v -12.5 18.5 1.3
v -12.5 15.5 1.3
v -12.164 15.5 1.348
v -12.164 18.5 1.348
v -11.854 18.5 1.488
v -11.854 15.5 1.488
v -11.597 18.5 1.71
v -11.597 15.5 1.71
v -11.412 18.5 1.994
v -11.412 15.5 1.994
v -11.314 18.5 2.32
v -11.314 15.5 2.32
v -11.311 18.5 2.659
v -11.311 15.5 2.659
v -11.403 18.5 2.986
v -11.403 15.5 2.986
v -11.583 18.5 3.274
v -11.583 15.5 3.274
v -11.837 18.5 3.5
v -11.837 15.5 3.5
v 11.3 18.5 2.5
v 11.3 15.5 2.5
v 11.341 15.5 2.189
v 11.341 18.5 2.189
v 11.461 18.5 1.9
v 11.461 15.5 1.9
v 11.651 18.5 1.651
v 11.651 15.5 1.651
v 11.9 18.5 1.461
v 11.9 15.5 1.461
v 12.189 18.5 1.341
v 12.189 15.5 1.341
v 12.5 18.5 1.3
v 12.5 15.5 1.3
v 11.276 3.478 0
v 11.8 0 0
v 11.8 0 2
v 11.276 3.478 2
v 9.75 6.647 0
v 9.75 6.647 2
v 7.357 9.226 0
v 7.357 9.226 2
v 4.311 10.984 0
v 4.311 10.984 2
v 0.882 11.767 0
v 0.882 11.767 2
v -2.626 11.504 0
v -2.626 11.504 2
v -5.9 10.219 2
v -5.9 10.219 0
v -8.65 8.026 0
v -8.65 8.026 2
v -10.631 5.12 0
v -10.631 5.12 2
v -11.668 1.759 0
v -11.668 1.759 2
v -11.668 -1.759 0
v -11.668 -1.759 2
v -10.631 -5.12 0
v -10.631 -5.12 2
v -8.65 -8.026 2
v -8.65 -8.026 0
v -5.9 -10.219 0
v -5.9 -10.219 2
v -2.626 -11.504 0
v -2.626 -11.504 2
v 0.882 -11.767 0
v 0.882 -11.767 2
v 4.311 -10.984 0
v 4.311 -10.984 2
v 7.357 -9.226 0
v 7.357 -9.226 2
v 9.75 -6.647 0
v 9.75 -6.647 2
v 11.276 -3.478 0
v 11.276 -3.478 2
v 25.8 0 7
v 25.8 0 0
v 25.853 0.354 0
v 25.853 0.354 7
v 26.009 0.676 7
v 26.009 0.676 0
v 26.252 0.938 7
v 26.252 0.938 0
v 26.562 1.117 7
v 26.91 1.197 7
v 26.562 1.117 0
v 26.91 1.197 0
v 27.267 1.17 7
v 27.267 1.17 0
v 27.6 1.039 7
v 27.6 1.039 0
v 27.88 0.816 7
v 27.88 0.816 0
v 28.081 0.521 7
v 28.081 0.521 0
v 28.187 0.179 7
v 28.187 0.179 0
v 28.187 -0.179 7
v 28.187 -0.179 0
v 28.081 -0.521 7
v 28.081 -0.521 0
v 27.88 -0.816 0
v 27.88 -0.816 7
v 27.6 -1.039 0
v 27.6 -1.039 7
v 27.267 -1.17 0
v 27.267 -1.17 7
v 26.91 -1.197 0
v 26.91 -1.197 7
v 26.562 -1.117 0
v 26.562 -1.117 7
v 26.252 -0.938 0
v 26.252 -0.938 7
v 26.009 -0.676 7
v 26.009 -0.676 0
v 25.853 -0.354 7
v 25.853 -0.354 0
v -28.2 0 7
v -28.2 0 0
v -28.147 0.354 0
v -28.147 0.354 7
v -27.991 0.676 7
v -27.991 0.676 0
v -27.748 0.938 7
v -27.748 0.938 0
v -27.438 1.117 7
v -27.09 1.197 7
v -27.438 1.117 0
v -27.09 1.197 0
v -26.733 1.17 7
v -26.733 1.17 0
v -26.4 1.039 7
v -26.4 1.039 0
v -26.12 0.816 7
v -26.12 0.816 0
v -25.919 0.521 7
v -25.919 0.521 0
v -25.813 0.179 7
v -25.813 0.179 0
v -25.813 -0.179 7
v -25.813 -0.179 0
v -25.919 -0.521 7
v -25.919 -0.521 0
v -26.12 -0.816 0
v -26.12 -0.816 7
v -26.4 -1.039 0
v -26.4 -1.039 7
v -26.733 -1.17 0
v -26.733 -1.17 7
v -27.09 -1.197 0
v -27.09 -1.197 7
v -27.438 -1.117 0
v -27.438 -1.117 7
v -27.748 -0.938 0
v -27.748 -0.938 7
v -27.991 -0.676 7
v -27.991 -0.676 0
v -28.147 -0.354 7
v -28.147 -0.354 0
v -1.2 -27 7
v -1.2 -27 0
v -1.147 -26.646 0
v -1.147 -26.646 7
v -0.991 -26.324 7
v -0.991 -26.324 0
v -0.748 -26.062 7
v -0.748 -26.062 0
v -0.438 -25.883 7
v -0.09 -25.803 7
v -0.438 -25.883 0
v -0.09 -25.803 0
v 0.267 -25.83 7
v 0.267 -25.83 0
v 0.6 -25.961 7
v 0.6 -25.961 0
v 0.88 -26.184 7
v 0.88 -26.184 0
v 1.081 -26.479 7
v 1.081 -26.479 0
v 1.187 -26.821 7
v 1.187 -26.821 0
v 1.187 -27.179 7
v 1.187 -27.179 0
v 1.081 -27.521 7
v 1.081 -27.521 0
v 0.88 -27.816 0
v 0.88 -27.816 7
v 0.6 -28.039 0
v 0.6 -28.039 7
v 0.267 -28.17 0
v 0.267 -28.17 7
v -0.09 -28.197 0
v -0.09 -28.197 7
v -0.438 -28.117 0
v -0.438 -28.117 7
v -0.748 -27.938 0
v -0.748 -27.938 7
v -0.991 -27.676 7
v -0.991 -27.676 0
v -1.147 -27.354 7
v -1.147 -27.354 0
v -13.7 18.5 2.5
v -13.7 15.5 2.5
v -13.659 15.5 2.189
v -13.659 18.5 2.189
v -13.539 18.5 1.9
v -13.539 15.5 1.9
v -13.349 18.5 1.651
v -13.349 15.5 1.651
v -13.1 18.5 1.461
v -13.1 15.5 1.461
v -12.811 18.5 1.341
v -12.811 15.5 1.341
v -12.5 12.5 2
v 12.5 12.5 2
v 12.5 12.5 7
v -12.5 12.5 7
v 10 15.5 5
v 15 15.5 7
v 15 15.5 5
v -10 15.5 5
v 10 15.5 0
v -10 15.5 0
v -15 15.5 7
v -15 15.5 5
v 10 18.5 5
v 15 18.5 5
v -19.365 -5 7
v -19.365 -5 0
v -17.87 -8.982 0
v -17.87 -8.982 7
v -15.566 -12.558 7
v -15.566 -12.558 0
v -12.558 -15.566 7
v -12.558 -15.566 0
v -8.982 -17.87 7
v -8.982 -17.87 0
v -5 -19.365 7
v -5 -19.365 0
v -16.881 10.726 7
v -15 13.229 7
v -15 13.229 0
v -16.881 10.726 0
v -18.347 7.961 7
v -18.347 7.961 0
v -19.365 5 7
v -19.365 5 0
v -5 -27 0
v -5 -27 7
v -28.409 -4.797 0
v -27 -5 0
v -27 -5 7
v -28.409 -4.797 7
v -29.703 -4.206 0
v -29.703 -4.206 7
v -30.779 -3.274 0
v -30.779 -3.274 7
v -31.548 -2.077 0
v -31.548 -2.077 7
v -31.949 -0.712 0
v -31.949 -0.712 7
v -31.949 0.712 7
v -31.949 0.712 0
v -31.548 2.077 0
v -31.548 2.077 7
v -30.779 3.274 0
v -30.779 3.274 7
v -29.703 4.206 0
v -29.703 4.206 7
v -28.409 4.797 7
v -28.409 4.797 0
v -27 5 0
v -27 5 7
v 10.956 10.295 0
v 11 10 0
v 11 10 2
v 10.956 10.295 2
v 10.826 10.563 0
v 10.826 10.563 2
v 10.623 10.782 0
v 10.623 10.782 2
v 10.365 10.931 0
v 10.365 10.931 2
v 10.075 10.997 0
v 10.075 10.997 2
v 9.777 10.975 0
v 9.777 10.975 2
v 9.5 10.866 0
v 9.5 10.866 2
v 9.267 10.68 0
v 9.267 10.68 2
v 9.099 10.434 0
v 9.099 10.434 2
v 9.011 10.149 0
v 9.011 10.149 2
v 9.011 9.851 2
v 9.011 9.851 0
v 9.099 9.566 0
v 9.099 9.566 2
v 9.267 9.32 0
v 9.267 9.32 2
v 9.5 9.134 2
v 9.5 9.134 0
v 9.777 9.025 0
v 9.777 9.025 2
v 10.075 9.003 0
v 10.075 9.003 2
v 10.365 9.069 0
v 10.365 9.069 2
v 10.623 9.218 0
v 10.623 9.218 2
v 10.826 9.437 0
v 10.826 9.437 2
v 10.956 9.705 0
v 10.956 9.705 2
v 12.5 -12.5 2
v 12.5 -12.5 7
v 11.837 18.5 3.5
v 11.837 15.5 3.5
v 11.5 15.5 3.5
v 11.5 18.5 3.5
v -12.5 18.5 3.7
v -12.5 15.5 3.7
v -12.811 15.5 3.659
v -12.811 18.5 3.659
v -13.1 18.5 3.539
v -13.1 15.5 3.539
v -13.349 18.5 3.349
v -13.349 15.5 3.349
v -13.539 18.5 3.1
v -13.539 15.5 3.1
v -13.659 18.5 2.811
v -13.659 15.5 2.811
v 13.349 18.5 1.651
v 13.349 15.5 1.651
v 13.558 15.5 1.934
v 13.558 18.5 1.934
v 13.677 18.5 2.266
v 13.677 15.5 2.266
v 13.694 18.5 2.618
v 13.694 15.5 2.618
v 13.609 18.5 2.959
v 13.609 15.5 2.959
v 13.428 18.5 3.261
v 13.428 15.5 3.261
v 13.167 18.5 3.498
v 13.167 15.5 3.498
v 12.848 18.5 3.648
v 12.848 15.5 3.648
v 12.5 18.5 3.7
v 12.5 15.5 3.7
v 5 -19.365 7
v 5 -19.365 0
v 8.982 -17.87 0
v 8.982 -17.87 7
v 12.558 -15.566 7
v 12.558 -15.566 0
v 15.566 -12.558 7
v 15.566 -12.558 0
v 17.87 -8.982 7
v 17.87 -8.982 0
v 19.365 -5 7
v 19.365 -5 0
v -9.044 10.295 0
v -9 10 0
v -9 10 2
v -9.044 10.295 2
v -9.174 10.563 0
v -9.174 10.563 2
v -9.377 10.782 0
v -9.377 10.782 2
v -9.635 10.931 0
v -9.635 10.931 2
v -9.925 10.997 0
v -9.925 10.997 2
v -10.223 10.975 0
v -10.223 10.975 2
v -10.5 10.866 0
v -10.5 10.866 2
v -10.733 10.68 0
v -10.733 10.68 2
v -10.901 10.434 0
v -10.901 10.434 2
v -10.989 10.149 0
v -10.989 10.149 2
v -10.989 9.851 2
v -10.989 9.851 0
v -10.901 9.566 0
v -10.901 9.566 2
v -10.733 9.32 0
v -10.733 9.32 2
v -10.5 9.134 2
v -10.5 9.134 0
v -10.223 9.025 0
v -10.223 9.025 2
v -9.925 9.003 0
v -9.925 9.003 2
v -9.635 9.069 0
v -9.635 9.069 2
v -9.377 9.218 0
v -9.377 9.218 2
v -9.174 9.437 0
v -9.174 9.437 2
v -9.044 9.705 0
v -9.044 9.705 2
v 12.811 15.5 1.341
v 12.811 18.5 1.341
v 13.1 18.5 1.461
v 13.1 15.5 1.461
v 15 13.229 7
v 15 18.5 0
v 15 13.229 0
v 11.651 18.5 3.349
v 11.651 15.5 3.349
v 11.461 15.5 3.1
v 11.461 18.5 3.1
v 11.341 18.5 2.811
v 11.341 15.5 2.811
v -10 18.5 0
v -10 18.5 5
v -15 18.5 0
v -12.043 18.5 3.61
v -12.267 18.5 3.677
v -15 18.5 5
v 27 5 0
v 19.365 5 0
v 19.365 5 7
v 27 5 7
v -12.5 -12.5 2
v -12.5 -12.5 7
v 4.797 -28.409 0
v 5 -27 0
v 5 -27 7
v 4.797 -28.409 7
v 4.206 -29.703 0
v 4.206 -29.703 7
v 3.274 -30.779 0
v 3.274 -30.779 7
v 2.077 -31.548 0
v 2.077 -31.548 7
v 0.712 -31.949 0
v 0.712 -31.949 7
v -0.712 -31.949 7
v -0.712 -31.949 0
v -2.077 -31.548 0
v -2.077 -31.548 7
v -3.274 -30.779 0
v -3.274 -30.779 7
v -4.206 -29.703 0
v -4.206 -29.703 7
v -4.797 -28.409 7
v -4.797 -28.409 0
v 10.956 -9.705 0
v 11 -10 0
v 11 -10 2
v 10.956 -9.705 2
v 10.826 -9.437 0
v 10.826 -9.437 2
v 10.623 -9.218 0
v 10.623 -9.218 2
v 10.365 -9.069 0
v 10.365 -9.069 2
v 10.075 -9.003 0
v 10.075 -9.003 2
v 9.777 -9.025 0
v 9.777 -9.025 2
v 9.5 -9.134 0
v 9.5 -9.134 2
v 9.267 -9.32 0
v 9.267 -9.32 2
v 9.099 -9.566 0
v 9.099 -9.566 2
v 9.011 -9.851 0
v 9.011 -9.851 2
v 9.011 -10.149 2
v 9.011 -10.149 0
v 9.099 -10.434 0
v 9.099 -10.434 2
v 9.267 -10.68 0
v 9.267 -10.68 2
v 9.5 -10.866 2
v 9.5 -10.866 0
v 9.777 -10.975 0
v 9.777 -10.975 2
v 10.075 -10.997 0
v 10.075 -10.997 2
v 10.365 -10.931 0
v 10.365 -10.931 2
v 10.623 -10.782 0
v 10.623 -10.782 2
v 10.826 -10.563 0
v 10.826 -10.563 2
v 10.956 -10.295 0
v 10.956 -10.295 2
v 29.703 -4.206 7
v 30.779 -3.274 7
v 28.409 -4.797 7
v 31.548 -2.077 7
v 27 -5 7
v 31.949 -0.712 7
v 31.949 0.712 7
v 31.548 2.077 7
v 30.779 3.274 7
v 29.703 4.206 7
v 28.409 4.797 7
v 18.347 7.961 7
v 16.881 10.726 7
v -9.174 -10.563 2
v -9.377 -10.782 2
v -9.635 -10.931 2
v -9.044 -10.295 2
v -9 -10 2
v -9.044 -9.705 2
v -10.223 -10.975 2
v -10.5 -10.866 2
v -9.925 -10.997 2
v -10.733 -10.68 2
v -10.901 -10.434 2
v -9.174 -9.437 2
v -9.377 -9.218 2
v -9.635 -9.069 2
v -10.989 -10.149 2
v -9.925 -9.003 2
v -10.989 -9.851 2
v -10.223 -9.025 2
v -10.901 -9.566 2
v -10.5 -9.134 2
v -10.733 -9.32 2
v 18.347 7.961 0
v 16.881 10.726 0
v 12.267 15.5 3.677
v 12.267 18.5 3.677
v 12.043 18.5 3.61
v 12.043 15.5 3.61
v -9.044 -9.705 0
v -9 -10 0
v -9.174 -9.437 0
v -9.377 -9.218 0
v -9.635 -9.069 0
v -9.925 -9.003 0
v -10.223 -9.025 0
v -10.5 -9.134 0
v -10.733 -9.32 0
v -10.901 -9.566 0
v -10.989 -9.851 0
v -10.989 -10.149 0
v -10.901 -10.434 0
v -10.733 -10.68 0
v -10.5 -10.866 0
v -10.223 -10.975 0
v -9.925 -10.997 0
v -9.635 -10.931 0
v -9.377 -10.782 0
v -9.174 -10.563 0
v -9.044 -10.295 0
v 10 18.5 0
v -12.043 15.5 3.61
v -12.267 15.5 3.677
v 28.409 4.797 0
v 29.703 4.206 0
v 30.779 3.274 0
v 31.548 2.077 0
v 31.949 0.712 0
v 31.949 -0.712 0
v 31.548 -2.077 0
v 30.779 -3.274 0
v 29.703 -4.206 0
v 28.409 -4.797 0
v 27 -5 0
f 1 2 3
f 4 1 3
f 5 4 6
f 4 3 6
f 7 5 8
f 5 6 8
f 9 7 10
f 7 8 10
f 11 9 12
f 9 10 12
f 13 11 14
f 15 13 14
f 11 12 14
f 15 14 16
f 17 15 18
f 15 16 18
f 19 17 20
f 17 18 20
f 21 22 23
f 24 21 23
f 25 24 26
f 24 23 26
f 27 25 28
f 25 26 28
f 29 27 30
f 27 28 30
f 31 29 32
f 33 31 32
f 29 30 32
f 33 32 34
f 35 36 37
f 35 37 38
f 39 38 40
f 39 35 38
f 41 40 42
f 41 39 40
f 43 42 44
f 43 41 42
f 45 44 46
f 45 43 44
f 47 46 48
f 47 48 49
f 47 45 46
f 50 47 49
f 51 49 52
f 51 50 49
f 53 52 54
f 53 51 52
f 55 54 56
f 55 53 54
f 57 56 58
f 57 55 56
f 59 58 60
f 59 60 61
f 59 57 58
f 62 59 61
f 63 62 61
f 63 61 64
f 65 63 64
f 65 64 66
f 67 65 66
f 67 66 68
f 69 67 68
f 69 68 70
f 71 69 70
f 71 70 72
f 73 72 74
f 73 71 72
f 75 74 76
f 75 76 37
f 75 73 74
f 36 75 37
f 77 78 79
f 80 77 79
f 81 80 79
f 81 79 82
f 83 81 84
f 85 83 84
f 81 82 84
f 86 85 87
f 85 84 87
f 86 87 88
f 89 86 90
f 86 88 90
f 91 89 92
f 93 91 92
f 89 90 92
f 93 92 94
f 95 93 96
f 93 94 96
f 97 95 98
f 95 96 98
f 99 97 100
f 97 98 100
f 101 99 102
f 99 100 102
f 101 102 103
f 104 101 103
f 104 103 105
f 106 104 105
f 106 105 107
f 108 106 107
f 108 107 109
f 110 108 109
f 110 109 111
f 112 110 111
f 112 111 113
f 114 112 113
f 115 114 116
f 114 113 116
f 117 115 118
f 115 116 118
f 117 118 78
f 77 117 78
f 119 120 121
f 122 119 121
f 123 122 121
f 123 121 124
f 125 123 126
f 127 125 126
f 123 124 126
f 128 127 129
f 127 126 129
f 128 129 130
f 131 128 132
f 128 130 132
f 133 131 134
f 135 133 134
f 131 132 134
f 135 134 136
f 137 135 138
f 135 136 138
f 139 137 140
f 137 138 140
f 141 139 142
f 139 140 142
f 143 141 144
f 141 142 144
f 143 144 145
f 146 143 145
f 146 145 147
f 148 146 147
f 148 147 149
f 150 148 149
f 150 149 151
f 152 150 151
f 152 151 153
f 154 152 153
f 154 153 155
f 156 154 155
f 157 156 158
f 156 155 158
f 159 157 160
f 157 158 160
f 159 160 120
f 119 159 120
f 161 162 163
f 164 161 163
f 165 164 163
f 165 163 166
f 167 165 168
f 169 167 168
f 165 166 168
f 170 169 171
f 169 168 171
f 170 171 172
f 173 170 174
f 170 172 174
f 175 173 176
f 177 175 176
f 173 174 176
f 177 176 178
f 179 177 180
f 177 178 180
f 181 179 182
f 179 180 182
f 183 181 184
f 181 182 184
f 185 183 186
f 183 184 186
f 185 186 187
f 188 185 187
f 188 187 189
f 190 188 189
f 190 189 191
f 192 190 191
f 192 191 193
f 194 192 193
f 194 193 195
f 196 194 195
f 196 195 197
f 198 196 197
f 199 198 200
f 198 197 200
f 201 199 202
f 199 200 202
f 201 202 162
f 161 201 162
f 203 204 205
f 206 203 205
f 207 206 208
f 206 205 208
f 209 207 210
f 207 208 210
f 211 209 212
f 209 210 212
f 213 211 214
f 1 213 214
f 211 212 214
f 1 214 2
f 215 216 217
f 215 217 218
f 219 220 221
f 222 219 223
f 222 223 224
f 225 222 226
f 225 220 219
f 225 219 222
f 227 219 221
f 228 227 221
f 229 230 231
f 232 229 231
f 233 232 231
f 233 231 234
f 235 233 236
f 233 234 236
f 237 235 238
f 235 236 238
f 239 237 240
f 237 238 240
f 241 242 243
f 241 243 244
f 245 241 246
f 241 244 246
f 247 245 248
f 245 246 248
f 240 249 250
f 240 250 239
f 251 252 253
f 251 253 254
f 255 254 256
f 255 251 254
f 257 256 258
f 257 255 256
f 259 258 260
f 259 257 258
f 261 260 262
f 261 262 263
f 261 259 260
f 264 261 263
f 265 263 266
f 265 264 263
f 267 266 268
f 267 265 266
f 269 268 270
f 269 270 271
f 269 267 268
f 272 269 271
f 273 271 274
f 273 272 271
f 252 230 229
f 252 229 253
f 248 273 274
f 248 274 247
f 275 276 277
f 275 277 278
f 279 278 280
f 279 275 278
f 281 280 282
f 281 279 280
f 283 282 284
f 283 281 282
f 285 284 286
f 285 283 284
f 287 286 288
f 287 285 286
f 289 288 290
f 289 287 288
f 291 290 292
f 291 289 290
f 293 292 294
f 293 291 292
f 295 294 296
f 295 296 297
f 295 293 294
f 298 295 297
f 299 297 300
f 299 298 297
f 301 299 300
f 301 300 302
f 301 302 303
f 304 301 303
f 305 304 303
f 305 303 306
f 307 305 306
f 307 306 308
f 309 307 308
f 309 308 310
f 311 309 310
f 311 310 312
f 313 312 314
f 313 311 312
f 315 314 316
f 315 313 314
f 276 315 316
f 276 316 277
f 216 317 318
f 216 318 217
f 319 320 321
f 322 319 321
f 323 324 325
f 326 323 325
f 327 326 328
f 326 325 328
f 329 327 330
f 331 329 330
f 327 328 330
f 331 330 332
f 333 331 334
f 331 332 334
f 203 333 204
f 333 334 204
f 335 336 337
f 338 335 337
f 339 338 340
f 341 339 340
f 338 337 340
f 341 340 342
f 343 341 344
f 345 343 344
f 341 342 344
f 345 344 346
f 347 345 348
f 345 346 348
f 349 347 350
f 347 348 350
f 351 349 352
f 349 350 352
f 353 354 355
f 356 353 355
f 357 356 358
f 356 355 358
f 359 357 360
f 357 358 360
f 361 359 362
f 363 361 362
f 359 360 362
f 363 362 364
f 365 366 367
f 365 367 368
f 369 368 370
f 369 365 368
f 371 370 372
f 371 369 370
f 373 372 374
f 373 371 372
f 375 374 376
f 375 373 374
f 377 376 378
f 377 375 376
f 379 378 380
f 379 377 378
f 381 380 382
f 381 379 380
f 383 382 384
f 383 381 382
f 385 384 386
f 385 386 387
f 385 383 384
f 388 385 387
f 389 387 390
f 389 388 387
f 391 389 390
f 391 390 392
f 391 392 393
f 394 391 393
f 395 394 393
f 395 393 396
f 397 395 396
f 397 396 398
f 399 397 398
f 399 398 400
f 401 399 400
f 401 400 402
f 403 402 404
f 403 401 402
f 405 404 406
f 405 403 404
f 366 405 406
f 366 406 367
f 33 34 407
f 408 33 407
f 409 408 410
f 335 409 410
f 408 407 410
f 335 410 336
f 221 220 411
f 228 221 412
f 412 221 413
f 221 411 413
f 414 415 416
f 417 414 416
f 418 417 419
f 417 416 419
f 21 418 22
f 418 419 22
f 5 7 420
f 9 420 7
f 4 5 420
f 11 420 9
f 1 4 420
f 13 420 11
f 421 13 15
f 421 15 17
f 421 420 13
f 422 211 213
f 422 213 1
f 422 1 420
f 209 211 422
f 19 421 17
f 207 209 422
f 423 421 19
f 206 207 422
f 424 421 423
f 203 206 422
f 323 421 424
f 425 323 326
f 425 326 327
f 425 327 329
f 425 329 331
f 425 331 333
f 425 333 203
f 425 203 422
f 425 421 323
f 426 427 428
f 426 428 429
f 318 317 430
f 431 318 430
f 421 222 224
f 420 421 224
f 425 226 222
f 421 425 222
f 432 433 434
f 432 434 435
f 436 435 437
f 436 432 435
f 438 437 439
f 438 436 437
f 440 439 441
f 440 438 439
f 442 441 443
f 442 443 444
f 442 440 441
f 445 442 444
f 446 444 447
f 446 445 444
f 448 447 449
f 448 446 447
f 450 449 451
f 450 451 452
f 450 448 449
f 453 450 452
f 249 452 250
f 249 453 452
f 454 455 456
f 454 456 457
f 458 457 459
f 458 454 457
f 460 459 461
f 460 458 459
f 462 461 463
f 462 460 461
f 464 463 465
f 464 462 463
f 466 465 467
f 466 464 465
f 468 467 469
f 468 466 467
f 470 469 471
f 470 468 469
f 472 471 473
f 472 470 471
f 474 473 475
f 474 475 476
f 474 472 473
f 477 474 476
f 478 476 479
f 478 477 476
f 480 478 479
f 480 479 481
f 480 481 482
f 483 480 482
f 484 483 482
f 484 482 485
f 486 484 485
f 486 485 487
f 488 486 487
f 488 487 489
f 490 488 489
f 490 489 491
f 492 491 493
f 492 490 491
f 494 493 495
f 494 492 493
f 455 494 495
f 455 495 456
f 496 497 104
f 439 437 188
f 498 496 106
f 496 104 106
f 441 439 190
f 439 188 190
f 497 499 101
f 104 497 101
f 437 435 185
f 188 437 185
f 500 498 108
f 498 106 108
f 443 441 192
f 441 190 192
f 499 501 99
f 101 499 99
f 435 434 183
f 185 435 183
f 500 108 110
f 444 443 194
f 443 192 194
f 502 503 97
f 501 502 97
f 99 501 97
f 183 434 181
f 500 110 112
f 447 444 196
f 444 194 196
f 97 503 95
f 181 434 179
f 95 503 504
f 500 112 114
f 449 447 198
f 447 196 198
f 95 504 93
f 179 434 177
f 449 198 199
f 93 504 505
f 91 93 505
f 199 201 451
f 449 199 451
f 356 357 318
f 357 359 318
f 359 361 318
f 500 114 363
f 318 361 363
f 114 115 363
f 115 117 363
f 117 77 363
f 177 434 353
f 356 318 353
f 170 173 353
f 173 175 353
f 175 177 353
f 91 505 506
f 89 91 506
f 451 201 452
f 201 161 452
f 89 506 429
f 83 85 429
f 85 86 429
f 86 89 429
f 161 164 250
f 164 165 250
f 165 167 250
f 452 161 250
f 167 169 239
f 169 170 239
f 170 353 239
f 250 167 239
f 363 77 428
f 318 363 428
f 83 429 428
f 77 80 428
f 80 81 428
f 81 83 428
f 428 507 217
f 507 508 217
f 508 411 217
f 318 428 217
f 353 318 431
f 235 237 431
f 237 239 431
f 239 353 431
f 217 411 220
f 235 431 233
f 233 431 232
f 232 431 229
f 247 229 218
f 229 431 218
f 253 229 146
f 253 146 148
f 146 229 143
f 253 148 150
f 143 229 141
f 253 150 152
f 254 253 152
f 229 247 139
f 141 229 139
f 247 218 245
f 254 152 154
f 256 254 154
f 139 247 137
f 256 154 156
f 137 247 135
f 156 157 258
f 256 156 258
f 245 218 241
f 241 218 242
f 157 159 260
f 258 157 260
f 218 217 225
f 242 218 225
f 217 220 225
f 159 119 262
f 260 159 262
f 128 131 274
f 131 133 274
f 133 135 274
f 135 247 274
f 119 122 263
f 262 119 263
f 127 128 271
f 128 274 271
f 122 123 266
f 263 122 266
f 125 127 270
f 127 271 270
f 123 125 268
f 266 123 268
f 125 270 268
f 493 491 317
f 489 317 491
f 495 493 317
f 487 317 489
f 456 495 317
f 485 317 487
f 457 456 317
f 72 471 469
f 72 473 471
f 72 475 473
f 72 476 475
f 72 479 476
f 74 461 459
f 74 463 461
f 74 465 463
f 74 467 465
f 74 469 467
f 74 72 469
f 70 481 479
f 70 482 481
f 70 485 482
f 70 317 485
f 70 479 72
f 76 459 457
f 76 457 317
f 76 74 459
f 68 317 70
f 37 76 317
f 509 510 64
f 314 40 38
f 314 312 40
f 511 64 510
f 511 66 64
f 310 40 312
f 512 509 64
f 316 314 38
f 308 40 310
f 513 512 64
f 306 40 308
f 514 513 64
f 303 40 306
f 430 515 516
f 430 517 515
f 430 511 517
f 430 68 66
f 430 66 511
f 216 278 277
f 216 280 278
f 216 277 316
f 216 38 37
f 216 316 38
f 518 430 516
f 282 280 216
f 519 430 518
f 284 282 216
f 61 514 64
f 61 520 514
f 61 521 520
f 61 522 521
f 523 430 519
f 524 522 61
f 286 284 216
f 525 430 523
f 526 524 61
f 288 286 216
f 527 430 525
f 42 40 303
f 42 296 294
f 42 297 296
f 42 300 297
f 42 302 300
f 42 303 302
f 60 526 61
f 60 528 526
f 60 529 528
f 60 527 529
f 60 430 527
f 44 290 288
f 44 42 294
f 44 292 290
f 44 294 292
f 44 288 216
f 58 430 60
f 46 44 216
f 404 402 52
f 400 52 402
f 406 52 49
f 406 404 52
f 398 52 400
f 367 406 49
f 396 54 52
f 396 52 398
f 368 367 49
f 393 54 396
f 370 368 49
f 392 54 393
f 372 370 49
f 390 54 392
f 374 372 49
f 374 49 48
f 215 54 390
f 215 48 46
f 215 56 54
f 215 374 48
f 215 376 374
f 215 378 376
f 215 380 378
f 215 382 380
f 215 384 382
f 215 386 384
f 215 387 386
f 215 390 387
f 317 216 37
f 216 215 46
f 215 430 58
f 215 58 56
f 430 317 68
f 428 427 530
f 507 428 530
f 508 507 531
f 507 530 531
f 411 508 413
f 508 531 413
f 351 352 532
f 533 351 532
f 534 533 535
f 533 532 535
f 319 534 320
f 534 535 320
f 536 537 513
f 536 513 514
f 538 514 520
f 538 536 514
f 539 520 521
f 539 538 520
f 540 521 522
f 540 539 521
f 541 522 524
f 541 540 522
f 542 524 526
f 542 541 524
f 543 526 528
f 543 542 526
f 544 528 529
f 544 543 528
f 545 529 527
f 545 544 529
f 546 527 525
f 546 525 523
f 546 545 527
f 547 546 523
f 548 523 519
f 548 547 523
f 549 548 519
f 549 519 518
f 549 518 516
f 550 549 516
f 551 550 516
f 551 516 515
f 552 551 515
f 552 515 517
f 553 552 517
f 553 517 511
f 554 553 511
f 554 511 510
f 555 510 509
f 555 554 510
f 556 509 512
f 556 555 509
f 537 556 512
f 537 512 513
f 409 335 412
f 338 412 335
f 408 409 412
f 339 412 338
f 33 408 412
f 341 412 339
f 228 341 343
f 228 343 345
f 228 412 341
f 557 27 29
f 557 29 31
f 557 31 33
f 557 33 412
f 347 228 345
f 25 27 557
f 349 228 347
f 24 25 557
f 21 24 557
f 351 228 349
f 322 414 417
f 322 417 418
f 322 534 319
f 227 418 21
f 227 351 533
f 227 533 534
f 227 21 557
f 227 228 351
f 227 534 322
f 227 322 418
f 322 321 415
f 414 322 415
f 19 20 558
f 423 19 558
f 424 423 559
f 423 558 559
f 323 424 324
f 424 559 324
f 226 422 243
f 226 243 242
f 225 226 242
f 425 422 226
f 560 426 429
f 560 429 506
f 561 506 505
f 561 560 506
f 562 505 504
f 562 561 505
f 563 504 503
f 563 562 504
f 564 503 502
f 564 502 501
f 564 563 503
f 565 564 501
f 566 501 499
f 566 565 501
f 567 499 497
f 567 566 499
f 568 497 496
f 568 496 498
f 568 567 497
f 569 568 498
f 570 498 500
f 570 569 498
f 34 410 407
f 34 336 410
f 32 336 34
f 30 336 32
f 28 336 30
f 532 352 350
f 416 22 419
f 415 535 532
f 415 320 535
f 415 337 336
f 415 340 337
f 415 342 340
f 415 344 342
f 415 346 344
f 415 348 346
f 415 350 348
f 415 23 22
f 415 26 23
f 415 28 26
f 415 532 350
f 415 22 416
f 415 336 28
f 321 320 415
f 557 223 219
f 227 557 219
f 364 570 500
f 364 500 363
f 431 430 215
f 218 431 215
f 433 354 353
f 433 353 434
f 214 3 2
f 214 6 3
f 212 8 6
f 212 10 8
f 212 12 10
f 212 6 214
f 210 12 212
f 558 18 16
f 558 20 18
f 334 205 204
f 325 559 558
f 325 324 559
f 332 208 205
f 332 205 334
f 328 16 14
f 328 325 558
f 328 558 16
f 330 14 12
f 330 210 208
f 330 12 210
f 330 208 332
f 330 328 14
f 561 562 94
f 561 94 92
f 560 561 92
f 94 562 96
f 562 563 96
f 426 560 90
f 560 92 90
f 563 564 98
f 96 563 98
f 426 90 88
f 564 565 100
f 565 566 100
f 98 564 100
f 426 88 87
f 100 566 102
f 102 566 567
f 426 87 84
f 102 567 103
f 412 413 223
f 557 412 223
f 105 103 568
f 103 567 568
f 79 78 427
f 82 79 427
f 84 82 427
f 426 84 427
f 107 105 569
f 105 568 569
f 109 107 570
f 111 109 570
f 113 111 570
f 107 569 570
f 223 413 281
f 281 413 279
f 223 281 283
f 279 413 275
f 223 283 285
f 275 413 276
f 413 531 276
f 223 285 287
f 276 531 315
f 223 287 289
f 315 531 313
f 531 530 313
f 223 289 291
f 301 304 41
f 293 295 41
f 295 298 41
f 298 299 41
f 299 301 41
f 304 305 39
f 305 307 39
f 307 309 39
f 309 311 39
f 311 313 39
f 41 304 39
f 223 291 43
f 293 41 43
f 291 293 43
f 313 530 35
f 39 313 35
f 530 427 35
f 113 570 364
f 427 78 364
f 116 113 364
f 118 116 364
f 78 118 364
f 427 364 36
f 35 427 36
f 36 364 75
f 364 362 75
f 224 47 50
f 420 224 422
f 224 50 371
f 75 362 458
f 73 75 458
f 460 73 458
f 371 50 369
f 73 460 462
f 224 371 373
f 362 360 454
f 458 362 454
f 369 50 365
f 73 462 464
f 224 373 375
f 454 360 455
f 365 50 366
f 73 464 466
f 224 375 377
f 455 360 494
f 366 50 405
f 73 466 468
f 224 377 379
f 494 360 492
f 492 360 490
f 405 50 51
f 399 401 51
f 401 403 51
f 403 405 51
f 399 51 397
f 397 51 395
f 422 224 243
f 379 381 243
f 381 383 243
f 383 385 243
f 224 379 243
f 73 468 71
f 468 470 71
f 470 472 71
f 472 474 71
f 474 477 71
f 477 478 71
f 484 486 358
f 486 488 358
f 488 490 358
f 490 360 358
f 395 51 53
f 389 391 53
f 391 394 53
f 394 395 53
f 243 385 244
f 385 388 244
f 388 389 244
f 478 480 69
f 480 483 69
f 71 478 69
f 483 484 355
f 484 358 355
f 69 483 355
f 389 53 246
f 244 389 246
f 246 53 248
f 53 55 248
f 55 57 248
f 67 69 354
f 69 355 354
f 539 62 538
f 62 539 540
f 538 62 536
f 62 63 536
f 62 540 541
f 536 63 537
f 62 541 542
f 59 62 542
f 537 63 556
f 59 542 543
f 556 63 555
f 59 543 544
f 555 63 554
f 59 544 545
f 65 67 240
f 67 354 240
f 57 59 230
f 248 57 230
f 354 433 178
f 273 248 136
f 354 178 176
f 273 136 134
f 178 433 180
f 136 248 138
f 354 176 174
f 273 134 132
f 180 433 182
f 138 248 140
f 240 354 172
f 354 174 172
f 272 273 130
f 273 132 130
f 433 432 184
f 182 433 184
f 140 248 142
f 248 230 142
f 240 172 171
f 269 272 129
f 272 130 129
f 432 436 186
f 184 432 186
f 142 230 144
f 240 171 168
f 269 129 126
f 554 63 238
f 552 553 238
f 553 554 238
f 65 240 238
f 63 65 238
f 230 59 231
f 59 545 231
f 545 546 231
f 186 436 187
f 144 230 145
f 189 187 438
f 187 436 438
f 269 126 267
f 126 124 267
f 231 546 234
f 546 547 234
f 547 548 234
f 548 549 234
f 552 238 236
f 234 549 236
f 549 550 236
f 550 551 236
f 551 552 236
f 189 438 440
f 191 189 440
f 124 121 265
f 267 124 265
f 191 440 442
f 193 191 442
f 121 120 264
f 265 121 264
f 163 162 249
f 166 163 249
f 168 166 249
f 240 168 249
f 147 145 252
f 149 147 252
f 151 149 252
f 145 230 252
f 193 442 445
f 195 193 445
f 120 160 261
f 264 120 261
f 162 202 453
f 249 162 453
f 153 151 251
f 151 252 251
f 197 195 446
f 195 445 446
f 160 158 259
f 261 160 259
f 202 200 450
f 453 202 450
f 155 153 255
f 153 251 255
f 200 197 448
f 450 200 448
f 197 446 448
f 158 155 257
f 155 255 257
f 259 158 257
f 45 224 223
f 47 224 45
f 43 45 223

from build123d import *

# Parameters (mm, degrees)
SKETCH2_R           = 20
SKETCH2_W           = 25
SKETCH2_H           = 25
SKETCH2_R_2         = 11.8
SKETCH2_R_3         = 1
BOSS_EXTRUDE1_DEPTH = 2
SKETCH2_3_R         = 20
SKETCH2_3_W         = 25
SKETCH2_3_H         = 25
BOSS_EXTRUDE2_DEPTH = 7
SKETCH4_R           = 1.2
BOSS_EXTRUDE3_DEPTH = 7
CUT_EXTRUDE8_START  = -7
SKETCH5_R           = 1.2
CUT_EXTRUDE8_DEPTH  = 7
SKETCH8_W           = 30
SKETCH8_H           = 7
BOSS_EXTRUDE5_DEPTH = 2.5
SKETCH9_W           = 30
SKETCH9_H           = 1.472120536
CUT_EXTRUDE9_DEPTH  = 12.5
BOSS_EXTRUDE6_DEPTH = 3


with BuildPart() as part:
    # Sketch2 → Boss-Extrude1 (new body)
    # profile 1 of 2: a face of its own
    with BuildSketch(Plane(origin=(0, 0, 0), x_dir=(0, 1, 0), z_dir=(0, 0, 1))):
        with Locations(Location((0, 0, 0), (0, 0, 270))):
            Circle(SKETCH2_R)
        Rectangle(SKETCH2_W, SKETCH2_H, mode=Mode.SUBTRACT)
    # profile 2 of 2: a face of its own
    with BuildSketch(Plane(origin=(0, 0, 0), x_dir=(0, 1, 0), z_dir=(0, 0, 1))):
        Rectangle(SKETCH2_W, SKETCH2_H)
        with Locations(Location((0, 0, 0), (0, 0, 270))):
            Circle(SKETCH2_R_2, mode=Mode.SUBTRACT)
        with Locations(Location((-10, -10, 0), (0, 0, 270))):
            Circle(SKETCH2_R_3, mode=Mode.SUBTRACT)
        with Locations(Location((10, -10, 0), (0, 0, 270))):
            Circle(SKETCH2_R_3, mode=Mode.SUBTRACT)
        with Locations(Location((10, 10, 0), (0, 0, 270))):
            Circle(SKETCH2_R_3, mode=Mode.SUBTRACT)
        with Locations(Location((-10, 10, 0), (0, 0, 270))):
            Circle(SKETCH2_R_3, mode=Mode.SUBTRACT)
    extrude(amount=BOSS_EXTRUDE1_DEPTH)

    # Sketch2<3> → Boss-Extrude2 (add)
    with BuildSketch(Plane(origin=(0, 0, 0), x_dir=(0, 1, 0), z_dir=(0, 0, 1))):
        with Locations(Location((0, 0, 0), (0, 0, 270))):
            Circle(SKETCH2_3_R)
        Rectangle(SKETCH2_3_W, SKETCH2_3_H, mode=Mode.SUBTRACT)
    extrude(amount=BOSS_EXTRUDE2_DEPTH)

    # Sketch4 → Boss-Extrude3 (add)
    # profile 1 of 4: a face of its own
    with BuildSketch(Plane(origin=(0, 0, 0), x_dir=(1, 0, 0), z_dir=(0, 0, -1))):
        with BuildLine():
            ThreePointArc((19.364916731, 5), (20, 0), (19.364916731, -5))
            Line((19.364916731, -5), (27, -5))
            ThreePointArc((27, -5), (32, 0), (27, 5))
            Line((27, 5), (19.364916731, 5))
        make_face()
        with Locations(Location((27, 0, 0), (0, 0, 180))):
            Circle(SKETCH4_R, mode=Mode.SUBTRACT)
    # profile 2 of 4: a face of its own
    with BuildSketch(Plane(origin=(0, 0, 0), x_dir=(1, 0, 0), z_dir=(0, 0, -1))):
        with BuildLine():
            ThreePointArc((-5, 19.364916731), (0, 20), (5, 19.364916731))
            Line((5, 19.364916731), (5, 27))
            ThreePointArc((5, 27), (0, 32), (-5, 27))
            Line((-5, 27), (-5, 19.364916731))
        make_face()
        with Locations(Location((0, 27, 0), (0, 0, 180))):
            Circle(SKETCH4_R, mode=Mode.SUBTRACT)
    # profile 3 of 4: a face of its own
    with BuildSketch(Plane(origin=(0, 0, 0), x_dir=(1, 0, 0), z_dir=(0, 0, -1))):
        with BuildLine():
            Line((5, -27), (5, -19.364916731))
            ThreePointArc((5, -19.364916731), (0, -20), (-5, -19.364916731))
            Line((-5, -19.364916731), (-5, -27))
            ThreePointArc((-5, -27), (0, -32), (5, -27))
        make_face()
        with Locations(Location((0, -27, 0), (0, 0, 180))):
            Circle(SKETCH4_R, mode=Mode.SUBTRACT)
    # profile 4 of 4: a face of its own
    with BuildSketch(Plane(origin=(0, 0, 0), x_dir=(1, 0, 0), z_dir=(0, 0, -1))):
        with BuildLine():
            ThreePointArc((-19.364916731, -5), (-20, 0), (-19.364916731, 5))
            Line((-19.364916731, 5), (-27, 5))
            ThreePointArc((-27, 5), (-32, 0), (-27, -5))
            Line((-27, -5), (-19.364916731, -5))
        make_face()
        with Locations(Location((-27, 0, 0), (0, 0, 180))):
            Circle(SKETCH4_R, mode=Mode.SUBTRACT)
    extrude(amount=-BOSS_EXTRUDE3_DEPTH)

    # Sketch5 → Cut-Extrude8 (cut)
    with BuildSketch(Plane.XY.offset(7).offset(CUT_EXTRUDE8_START)):
        with BuildLine():
            Line((-12.5, 15.612494996), (-12.5, 15.5))
            Line((-12.5, 15.5), (12.5, 15.5))
            Line((12.5, 15.5), (12.5, 15.612494996))
            ThreePointArc((12.5, 15.612494996), (8.948891955, 17.886233052), (5, 19.364916731))
            Line((5, 19.364916731), (5, 27))
            ThreePointArc((5, 27), (0, 32), (-5, 27))
            Line((-5, 27), (-5, 19.364916731))
            ThreePointArc((-5, 19.364916731), (-8.948891955, 17.886233052), (-12.5, 15.612494996))
        make_face()
        with Locations((0, 27)):
            Circle(SKETCH5_R, mode=Mode.SUBTRACT)
    extrude(amount=CUT_EXTRUDE8_DEPTH, mode=Mode.SUBTRACT)

    # Sketch8 → Boss-Extrude5 (add)
    with BuildSketch(Plane(origin=(0, 15.5, 0), x_dir=(-1, 0, 0), z_dir=(0, 1, 0))):
        with Locations((0, 3.5)):
            Rectangle(SKETCH8_W, SKETCH8_H)
    extrude(amount=-BOSS_EXTRUDE5_DEPTH)

    # Sketch9 → Cut-Extrude9 (cut)
    with BuildSketch(Plane.XY.offset(7)):
        with Locations((0, 16.236060268)):
            Rectangle(SKETCH9_W, SKETCH9_H)
    extrude(amount=-CUT_EXTRUDE9_DEPTH, mode=Mode.SUBTRACT)

    # Sketch8<5> → Boss-Extrude6 (add)
    with BuildSketch(Plane(origin=(0, 15.5, 0), x_dir=(-1, 0, 0), z_dir=(0, 1, 0))):
        with BuildLine():
            Line((-10, 3.5), (-11.5, 3.5))
            Line((-11.5, 3.5), (-11.651471863, 3.348528137))
            ThreePointArc((-11.651471863, 3.348528137), (-11.391344561, 2.959220119), (-11.3, 2.5))
            ThreePointArc((-11.3, 2.5), (-11.651471863, 1.651471863), (-12.5, 1.3))
            Line((-12.5, 1.3), (-12.5, 0))
            Line((-12.5, 0), (-10, 0))
            Line((-10, 0), (-10, 3.5))
        make_face()
        with BuildLine():
            ThreePointArc((-12.5, 1.3), (-12.959220119, 1.391344561), (-13.348528137, 1.651471863))
            Line((-13.348528137, 1.651471863), (-15, 0))
            Line((-15, 0), (-12.5, 0))
            Line((-12.5, 0), (-12.5, 1.3))
        make_face()
        with BuildLine():
            ThreePointArc((-13.348528137, 1.651471863), (-13.608655439, 2.959220119), (-12.5, 3.7))
            Line((-12.5, 3.7), (-12.5, 5))
            Line((-12.5, 5), (-15, 5))
            Line((-15, 5), (-15, 0))
            Line((-15, 0), (-13.348528137, 1.651471863))
        make_face()
        with BuildLine():
            ThreePointArc((-12.5, 3.7), (-12.153589838, 3.648912529), (-11.836675042, 3.5))
            Line((-11.836675042, 3.5), (-11.5, 3.5))
            Line((-11.5, 3.5), (-10, 5))
            Line((-10, 5), (-12.5, 5))
            Line((-12.5, 5), (-12.5, 3.7))
        make_face()
        Polygon((-10, 5), (-11.5, 3.5), (-10, 3.5), align=None)
        with BuildLine():
            Line((11.836675042, 3.5), (10, 3.5))
            Line((10, 3.5), (10, 0))
            Line((10, 0), (12.5, 0))
            Line((12.5, 0), (12.5, 1.3))
            ThreePointArc((12.5, 1.3), (11.351087471, 2.153589838), (11.836675042, 3.5))
        make_face()
        with BuildLine():
            Line((10, 5), (10, 3.5))
            Line((10, 3.5), (11.836675042, 3.5))
            ThreePointArc((11.836675042, 3.5), (12.153589838, 3.648912529), (12.5, 3.7))
            Line((12.5, 3.7), (12.5, 5))
            Line((12.5, 5), (10, 5))
        make_face()
        with BuildLine():
            Line((15, 5), (12.5, 5))
            Line((12.5, 5), (12.5, 3.7))
            ThreePointArc((12.5, 3.7), (13.348528137, 3.348528137), (13.7, 2.5))
            ThreePointArc((13.7, 2.5), (13.348528137, 1.651471863), (12.5, 1.3))
            Line((12.5, 1.3), (12.5, 0))
            Line((12.5, 0), (15, 0))
            Line((15, 0), (15, 5))
        make_face()
    extrude(amount=BOSS_EXTRUDE6_DEPTH)


solid = part.part
